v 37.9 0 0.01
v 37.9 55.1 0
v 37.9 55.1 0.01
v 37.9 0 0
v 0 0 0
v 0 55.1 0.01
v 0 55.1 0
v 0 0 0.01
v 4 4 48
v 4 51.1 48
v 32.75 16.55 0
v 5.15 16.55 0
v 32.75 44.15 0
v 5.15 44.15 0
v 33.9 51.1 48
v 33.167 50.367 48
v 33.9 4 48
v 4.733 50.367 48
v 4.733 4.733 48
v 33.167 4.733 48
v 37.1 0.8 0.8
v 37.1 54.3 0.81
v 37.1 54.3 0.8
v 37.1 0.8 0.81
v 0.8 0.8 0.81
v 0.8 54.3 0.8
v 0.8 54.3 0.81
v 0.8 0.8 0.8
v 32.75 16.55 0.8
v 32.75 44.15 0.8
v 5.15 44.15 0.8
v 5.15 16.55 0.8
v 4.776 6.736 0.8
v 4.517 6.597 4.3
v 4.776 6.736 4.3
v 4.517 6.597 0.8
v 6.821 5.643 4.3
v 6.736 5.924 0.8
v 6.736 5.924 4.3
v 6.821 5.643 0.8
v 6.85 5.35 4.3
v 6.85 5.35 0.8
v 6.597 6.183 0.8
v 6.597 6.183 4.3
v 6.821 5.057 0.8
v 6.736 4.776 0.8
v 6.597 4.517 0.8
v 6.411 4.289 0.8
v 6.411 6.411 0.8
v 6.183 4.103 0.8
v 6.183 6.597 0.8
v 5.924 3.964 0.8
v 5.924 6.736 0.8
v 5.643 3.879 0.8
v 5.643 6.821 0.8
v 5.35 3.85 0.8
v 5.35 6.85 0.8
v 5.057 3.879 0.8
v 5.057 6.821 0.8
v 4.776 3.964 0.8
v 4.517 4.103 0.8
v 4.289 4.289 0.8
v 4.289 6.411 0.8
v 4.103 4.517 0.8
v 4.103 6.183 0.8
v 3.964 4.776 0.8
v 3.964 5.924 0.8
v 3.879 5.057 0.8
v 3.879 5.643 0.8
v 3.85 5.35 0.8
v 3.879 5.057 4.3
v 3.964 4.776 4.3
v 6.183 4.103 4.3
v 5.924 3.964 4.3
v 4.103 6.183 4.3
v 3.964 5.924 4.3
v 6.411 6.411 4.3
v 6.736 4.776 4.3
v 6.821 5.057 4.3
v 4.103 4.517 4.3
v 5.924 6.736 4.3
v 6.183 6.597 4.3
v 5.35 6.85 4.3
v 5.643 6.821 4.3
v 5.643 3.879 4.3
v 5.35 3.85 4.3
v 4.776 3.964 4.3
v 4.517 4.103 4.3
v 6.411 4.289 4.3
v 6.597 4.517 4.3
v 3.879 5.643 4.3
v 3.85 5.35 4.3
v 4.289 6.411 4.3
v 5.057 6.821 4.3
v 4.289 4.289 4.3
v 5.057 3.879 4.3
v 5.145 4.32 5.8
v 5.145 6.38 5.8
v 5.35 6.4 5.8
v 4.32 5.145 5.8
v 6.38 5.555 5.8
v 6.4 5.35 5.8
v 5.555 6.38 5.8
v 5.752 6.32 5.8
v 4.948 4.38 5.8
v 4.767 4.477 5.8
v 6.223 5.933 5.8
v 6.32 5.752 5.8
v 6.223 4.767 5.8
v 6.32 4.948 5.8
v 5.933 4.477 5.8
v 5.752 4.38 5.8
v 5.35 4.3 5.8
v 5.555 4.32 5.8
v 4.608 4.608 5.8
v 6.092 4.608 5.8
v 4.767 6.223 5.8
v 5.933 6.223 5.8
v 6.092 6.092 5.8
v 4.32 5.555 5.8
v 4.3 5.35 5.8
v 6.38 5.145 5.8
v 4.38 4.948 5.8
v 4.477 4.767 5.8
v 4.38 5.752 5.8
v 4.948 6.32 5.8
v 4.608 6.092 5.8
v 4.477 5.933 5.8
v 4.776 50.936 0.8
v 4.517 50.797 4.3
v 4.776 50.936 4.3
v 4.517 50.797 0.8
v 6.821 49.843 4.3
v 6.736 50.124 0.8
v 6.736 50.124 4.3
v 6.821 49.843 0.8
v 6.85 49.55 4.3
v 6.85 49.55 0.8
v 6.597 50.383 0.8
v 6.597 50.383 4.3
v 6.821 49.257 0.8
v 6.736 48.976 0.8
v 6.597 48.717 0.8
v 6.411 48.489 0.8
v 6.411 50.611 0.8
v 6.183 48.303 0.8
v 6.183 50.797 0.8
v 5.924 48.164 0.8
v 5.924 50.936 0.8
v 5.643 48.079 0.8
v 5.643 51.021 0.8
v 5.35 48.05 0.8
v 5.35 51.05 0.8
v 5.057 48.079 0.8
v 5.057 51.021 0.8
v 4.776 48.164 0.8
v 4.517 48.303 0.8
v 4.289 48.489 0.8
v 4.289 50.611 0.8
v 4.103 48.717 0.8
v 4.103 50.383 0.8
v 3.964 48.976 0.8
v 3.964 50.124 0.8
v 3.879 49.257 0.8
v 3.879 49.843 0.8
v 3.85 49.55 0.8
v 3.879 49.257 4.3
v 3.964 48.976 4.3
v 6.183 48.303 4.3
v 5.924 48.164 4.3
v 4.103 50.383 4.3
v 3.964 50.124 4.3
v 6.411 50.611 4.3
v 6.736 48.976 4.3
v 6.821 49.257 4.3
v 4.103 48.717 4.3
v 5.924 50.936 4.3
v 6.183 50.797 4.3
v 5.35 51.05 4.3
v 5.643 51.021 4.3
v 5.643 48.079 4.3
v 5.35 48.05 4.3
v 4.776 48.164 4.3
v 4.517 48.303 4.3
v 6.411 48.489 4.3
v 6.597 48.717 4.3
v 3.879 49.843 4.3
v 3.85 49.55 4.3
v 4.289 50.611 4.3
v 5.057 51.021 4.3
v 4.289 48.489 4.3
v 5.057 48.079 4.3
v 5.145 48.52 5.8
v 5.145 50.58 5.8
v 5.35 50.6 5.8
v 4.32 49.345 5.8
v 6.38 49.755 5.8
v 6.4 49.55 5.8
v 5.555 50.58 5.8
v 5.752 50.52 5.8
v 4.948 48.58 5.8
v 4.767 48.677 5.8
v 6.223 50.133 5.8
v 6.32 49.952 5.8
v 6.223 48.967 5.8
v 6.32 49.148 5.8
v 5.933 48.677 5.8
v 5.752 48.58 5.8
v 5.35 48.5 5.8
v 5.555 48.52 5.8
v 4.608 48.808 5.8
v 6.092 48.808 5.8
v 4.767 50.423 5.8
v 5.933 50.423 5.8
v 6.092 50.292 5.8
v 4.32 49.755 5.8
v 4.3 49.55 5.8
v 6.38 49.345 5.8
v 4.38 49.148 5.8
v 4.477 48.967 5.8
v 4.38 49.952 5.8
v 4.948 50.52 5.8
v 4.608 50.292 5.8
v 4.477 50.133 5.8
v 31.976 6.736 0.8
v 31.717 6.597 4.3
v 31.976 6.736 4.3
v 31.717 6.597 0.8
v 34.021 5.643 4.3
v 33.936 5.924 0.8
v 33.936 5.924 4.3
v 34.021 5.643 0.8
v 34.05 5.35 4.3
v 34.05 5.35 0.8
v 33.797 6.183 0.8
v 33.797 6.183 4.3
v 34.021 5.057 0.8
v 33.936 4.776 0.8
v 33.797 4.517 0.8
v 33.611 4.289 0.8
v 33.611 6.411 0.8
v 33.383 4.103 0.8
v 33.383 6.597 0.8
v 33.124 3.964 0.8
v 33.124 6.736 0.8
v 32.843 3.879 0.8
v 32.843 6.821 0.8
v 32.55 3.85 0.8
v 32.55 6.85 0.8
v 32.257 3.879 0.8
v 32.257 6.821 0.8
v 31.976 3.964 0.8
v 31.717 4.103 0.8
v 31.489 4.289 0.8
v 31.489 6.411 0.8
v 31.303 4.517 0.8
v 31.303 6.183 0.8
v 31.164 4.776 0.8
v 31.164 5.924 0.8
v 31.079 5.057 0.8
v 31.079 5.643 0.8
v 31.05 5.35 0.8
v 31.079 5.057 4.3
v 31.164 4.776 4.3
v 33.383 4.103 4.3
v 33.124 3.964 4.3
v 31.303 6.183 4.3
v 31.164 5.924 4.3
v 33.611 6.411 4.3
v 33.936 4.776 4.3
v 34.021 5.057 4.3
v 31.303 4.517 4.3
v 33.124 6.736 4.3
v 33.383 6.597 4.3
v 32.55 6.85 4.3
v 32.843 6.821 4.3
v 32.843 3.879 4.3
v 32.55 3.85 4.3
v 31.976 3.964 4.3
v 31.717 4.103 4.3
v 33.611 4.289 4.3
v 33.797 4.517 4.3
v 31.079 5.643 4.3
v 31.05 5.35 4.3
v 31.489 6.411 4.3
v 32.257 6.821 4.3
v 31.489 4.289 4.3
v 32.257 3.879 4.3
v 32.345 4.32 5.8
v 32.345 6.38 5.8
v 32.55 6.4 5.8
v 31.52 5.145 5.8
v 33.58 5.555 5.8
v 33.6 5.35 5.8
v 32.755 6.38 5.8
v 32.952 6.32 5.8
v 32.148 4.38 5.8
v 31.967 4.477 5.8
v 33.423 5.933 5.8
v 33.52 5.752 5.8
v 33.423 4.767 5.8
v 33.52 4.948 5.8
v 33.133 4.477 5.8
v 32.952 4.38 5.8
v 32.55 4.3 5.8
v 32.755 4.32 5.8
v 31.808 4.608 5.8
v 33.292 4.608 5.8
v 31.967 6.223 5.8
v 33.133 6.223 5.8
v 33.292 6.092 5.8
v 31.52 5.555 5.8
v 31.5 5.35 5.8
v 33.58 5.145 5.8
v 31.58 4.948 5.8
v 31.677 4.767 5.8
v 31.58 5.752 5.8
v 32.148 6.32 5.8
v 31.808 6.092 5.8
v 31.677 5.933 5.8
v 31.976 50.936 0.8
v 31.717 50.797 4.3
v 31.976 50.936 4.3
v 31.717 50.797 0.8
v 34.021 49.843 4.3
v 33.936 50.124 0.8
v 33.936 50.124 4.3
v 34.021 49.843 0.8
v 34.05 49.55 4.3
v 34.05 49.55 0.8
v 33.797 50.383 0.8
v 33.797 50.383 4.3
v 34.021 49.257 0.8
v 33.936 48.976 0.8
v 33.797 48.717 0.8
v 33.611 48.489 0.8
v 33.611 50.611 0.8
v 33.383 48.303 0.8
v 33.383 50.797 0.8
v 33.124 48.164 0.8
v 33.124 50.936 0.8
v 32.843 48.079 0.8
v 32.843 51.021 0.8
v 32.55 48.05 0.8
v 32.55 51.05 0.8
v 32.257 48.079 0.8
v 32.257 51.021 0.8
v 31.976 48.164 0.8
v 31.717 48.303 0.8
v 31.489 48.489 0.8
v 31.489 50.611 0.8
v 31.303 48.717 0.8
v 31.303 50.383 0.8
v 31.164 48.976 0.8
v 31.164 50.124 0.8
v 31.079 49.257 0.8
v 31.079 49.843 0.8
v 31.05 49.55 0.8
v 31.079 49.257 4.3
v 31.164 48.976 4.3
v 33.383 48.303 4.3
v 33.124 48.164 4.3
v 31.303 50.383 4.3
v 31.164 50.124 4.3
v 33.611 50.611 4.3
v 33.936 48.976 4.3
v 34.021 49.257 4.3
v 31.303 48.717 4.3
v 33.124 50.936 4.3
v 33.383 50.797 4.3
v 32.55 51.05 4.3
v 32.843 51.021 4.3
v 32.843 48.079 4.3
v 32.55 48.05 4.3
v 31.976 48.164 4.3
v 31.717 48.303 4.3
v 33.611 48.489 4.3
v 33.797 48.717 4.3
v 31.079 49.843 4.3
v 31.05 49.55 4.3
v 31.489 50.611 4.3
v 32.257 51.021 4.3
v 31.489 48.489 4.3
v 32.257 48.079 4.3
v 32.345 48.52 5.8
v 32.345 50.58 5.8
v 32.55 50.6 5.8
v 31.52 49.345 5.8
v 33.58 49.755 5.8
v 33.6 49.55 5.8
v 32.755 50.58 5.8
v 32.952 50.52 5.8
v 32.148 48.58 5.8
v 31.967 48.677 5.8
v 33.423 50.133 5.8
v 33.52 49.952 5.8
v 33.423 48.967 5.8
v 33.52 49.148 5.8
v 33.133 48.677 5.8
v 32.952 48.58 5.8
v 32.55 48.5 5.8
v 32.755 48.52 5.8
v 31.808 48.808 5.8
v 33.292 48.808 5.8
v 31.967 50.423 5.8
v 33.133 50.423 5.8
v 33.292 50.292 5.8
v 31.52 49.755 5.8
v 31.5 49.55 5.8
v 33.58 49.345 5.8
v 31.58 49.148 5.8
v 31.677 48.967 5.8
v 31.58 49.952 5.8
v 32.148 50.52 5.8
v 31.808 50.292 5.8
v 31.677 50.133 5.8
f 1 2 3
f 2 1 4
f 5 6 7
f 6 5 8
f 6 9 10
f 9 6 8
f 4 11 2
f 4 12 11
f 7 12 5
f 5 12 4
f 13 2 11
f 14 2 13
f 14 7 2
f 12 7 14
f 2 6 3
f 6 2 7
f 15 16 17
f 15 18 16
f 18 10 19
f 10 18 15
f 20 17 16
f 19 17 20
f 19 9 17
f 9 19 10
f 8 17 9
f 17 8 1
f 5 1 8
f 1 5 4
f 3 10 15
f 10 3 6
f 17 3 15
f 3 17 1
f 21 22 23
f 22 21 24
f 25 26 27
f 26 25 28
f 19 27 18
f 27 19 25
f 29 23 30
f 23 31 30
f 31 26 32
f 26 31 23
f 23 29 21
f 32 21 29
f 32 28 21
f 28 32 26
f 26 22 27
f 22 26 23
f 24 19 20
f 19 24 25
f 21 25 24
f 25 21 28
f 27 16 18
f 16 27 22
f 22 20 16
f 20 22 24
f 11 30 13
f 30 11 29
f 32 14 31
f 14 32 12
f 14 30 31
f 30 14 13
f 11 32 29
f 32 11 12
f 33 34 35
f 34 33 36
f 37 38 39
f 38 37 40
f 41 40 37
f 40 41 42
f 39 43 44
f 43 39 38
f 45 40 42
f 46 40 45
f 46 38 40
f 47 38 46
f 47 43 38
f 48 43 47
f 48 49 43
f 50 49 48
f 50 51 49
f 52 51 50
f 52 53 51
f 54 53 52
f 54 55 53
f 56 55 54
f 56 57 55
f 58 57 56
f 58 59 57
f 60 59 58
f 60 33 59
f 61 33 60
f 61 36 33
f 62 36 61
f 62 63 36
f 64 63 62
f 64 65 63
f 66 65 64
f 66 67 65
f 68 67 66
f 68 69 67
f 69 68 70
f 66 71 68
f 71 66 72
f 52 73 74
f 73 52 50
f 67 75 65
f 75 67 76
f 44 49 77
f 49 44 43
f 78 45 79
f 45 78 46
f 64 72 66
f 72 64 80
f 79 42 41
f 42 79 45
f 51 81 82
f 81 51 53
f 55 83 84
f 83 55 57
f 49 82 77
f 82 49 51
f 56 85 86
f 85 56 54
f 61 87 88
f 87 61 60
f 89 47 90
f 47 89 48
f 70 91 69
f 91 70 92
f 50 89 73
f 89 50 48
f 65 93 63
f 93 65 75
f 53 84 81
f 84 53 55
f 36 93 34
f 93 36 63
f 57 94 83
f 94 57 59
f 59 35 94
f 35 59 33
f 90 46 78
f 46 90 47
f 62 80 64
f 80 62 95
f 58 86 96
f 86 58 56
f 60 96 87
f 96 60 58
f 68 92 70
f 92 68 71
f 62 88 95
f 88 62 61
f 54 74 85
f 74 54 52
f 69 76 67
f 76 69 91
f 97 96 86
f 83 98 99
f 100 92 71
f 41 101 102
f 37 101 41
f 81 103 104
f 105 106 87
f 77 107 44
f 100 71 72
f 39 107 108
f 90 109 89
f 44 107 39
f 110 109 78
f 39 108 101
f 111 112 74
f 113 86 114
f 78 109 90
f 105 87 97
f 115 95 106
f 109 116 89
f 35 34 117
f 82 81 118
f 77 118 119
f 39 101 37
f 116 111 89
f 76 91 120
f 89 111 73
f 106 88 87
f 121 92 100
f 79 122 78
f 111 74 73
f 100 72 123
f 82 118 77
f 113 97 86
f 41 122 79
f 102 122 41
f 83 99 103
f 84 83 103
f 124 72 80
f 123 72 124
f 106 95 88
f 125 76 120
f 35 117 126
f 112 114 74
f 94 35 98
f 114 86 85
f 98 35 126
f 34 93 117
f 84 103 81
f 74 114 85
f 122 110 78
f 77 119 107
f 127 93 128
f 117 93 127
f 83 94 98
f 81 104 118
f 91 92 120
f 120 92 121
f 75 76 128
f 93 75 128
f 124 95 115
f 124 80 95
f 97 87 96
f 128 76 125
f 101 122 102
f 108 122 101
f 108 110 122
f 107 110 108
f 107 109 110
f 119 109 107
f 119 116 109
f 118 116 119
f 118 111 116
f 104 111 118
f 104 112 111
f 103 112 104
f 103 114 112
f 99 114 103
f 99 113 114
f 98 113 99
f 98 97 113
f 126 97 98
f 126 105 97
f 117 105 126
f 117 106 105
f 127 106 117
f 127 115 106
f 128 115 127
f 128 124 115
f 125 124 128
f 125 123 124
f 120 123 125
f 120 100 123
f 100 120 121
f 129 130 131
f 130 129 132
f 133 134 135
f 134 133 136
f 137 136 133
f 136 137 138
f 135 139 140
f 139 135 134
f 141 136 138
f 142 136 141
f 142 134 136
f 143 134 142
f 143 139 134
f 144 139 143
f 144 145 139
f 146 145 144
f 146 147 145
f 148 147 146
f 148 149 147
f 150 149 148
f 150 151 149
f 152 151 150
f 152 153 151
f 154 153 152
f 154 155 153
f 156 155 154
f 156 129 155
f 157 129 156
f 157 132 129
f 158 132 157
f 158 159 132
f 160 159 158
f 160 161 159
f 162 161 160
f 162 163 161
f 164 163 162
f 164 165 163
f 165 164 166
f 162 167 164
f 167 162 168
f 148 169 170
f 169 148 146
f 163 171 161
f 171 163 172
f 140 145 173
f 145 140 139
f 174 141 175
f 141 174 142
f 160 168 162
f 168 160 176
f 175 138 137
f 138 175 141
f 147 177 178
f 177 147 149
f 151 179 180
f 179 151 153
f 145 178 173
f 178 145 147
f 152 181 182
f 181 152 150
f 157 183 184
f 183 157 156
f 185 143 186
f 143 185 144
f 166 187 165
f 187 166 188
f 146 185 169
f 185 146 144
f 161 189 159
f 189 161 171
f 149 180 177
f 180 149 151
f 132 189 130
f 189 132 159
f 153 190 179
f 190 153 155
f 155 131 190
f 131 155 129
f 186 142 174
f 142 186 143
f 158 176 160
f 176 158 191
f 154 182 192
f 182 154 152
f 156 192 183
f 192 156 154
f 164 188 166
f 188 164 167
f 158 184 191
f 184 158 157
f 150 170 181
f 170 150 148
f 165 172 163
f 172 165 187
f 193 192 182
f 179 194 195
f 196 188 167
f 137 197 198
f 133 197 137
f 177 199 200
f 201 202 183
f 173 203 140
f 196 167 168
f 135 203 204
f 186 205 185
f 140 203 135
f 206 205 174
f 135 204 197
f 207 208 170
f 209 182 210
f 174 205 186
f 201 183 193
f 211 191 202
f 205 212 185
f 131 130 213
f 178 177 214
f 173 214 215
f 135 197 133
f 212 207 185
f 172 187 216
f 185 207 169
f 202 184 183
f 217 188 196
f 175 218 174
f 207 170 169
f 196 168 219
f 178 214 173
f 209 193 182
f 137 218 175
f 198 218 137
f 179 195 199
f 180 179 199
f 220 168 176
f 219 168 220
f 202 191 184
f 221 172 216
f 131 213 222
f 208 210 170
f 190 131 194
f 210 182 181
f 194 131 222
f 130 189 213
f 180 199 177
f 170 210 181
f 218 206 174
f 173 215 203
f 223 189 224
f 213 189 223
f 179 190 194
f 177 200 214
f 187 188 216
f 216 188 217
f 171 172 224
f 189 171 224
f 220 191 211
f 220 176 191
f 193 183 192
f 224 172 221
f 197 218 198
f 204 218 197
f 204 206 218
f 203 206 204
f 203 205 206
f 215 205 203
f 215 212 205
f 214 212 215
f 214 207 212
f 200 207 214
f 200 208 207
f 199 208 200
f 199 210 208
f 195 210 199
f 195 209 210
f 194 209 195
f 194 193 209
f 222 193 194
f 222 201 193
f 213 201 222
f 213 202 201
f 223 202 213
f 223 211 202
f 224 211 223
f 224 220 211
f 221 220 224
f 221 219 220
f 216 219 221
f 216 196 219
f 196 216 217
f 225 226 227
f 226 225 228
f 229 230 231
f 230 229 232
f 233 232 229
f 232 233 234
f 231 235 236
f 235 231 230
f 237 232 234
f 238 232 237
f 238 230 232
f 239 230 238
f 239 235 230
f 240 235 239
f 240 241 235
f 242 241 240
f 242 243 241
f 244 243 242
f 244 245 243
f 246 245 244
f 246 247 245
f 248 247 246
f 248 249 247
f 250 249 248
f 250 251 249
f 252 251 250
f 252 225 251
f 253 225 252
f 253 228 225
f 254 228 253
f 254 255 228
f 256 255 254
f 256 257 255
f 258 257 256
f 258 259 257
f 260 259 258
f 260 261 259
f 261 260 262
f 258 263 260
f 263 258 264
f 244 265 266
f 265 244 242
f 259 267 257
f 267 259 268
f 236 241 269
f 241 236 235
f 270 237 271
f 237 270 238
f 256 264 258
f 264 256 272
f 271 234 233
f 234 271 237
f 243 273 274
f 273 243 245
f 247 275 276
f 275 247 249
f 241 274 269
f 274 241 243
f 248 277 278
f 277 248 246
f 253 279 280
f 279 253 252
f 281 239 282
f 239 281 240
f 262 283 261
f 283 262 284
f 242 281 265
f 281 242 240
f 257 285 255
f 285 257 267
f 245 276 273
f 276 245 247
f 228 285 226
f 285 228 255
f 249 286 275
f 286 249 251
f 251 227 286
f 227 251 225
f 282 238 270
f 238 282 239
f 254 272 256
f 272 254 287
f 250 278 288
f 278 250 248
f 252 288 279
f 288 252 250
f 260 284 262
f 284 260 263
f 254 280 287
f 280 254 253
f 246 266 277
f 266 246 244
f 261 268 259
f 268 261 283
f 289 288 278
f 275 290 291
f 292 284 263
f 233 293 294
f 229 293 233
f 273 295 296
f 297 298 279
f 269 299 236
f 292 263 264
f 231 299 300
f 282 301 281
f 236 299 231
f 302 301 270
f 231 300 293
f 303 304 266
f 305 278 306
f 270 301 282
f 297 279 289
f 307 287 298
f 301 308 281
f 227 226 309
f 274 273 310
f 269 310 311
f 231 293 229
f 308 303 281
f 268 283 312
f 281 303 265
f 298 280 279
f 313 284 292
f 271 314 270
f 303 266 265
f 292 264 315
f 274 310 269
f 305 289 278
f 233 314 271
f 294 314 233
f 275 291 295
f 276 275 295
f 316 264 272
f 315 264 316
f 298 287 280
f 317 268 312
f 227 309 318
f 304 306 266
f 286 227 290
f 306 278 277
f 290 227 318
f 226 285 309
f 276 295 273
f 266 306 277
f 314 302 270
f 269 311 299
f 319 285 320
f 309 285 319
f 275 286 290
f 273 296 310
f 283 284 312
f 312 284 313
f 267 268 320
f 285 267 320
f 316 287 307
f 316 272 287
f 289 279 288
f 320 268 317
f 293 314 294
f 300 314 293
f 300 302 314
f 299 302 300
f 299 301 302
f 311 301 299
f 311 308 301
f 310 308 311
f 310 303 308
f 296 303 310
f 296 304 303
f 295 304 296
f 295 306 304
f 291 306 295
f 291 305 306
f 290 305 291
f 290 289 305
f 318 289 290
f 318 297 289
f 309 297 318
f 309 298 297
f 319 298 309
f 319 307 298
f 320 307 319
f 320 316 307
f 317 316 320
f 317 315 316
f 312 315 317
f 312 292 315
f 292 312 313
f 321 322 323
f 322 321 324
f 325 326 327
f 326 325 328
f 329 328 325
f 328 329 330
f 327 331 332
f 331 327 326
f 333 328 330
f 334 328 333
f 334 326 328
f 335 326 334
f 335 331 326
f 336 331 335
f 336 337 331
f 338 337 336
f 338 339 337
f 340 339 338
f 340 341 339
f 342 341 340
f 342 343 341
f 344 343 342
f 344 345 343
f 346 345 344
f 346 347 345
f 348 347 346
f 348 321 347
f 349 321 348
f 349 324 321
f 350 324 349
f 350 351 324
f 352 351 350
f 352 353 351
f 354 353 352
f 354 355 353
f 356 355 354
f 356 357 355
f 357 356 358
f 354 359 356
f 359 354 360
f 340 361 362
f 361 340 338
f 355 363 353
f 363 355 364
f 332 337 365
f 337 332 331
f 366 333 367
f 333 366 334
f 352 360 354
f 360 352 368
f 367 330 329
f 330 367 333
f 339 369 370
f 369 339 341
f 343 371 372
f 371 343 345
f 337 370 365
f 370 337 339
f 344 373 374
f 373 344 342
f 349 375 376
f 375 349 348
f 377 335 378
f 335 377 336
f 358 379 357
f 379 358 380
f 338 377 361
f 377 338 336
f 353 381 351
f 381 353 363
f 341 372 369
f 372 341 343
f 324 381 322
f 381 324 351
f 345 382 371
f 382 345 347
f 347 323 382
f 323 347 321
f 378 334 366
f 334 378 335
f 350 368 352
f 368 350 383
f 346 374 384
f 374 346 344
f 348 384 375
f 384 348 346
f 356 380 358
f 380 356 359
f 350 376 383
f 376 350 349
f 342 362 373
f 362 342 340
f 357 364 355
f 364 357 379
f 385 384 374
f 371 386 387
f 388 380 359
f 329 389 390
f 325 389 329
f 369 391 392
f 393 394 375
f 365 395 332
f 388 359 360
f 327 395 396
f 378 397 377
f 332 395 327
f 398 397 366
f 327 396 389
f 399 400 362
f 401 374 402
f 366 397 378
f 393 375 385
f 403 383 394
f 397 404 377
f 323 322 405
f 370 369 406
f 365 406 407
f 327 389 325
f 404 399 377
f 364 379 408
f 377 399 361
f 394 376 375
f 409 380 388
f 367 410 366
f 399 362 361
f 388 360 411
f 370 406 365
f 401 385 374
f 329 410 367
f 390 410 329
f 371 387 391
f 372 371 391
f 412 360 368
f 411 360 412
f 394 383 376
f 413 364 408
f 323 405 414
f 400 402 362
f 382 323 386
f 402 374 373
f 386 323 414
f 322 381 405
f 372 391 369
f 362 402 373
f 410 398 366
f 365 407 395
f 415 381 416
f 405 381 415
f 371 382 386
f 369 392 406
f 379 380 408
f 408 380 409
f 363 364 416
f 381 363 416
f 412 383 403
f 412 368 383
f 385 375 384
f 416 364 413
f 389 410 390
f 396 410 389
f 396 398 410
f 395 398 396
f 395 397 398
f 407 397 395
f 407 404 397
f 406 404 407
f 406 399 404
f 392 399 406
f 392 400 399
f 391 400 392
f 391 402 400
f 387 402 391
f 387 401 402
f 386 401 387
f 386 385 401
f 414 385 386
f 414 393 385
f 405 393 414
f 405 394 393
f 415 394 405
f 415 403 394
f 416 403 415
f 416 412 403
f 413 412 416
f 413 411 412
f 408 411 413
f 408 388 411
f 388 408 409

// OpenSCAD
display_x = 32.8;
display_y = 50;
nozzle = 0.4;
wall = nozzle * 2;
print_margin = 0.15;
extra_space = 2;
outer_x = display_x + wall + print_margin * 2 + extra_space * 2;
outer_y = display_y + wall + print_margin * 2 + extra_space * 2;
outer_height_z = 48;
slant_offset = 8;
inner_x = outer_x - 2 * wall;
inner_y = outer_y - 2 * wall;
display_window = 27.6;
epsilon = 0.01;
window_y_offset = 2.8;
pin_diameter = 3;
pin_height = 5;
pin_y_top_offset = 5.4;
pin_y_bottom_offset = 11.2;
pin_corner_offset = 0.2;
pin_facets = 32;

module slanted_body(w, d, h, slant) {
    hull() {
        translate([0, 0, 0])
            cube([w, d, epsilon]);
        translate([slant / 2, slant / 2, h - epsilon])
            cube([w - slant, d - slant, epsilon]);
    }
}

module outer_shell() {
    slanted_body(outer_x, outer_y, outer_height_z, slant_offset);
}

module inner_cavity() {
    translate([wall, wall, wall])
        slanted_body(inner_x, inner_y, outer_height_z, slant_offset);
}

module eink_window() {
    translate([
        (outer_x - display_window) / 2,
        ((outer_y - display_window) / 2) + window_y_offset,
        -epsilon
    ])
        cube([
            display_window,
            display_window,
            wall + 2 * epsilon + 0.5
        ]);
}

module chamfered_pin(d, h) {
    chamfer_height = h * 0.3;
    base_height = h - chamfer_height;
    cylinder(h = base_height, d = d, $fn = pin_facets);
    translate([0, 0, base_height])
        cylinder(h = chamfer_height, d1 = d, d2 = d * 0.7, $fn = pin_facets);
}

module pins() {
    window_x_left = (outer_x - display_window) / 2;
    window_x_right = (outer_x + display_window) / 2;
    window_y_bot = ((outer_y - display_window) / 2) + window_y_offset;
    window_y_top = ((outer_y + display_window) / 2) + window_y_offset;
    pin_x_left = window_x_left + pin_corner_offset;
    pin_x_right = window_x_right - pin_corner_offset;
    for (px = [pin_x_left, pin_x_right]) {
        translate([px, window_y_bot - pin_y_bottom_offset, wall])
            chamfered_pin(pin_diameter, pin_height);
        translate([px, window_y_top + pin_y_top_offset, wall])
            chamfered_pin(pin_diameter, pin_height);
    }
}

union() {
    difference() {
        outer_shell();
        inner_cavity();
        eink_window();
    }
    pins();
}
